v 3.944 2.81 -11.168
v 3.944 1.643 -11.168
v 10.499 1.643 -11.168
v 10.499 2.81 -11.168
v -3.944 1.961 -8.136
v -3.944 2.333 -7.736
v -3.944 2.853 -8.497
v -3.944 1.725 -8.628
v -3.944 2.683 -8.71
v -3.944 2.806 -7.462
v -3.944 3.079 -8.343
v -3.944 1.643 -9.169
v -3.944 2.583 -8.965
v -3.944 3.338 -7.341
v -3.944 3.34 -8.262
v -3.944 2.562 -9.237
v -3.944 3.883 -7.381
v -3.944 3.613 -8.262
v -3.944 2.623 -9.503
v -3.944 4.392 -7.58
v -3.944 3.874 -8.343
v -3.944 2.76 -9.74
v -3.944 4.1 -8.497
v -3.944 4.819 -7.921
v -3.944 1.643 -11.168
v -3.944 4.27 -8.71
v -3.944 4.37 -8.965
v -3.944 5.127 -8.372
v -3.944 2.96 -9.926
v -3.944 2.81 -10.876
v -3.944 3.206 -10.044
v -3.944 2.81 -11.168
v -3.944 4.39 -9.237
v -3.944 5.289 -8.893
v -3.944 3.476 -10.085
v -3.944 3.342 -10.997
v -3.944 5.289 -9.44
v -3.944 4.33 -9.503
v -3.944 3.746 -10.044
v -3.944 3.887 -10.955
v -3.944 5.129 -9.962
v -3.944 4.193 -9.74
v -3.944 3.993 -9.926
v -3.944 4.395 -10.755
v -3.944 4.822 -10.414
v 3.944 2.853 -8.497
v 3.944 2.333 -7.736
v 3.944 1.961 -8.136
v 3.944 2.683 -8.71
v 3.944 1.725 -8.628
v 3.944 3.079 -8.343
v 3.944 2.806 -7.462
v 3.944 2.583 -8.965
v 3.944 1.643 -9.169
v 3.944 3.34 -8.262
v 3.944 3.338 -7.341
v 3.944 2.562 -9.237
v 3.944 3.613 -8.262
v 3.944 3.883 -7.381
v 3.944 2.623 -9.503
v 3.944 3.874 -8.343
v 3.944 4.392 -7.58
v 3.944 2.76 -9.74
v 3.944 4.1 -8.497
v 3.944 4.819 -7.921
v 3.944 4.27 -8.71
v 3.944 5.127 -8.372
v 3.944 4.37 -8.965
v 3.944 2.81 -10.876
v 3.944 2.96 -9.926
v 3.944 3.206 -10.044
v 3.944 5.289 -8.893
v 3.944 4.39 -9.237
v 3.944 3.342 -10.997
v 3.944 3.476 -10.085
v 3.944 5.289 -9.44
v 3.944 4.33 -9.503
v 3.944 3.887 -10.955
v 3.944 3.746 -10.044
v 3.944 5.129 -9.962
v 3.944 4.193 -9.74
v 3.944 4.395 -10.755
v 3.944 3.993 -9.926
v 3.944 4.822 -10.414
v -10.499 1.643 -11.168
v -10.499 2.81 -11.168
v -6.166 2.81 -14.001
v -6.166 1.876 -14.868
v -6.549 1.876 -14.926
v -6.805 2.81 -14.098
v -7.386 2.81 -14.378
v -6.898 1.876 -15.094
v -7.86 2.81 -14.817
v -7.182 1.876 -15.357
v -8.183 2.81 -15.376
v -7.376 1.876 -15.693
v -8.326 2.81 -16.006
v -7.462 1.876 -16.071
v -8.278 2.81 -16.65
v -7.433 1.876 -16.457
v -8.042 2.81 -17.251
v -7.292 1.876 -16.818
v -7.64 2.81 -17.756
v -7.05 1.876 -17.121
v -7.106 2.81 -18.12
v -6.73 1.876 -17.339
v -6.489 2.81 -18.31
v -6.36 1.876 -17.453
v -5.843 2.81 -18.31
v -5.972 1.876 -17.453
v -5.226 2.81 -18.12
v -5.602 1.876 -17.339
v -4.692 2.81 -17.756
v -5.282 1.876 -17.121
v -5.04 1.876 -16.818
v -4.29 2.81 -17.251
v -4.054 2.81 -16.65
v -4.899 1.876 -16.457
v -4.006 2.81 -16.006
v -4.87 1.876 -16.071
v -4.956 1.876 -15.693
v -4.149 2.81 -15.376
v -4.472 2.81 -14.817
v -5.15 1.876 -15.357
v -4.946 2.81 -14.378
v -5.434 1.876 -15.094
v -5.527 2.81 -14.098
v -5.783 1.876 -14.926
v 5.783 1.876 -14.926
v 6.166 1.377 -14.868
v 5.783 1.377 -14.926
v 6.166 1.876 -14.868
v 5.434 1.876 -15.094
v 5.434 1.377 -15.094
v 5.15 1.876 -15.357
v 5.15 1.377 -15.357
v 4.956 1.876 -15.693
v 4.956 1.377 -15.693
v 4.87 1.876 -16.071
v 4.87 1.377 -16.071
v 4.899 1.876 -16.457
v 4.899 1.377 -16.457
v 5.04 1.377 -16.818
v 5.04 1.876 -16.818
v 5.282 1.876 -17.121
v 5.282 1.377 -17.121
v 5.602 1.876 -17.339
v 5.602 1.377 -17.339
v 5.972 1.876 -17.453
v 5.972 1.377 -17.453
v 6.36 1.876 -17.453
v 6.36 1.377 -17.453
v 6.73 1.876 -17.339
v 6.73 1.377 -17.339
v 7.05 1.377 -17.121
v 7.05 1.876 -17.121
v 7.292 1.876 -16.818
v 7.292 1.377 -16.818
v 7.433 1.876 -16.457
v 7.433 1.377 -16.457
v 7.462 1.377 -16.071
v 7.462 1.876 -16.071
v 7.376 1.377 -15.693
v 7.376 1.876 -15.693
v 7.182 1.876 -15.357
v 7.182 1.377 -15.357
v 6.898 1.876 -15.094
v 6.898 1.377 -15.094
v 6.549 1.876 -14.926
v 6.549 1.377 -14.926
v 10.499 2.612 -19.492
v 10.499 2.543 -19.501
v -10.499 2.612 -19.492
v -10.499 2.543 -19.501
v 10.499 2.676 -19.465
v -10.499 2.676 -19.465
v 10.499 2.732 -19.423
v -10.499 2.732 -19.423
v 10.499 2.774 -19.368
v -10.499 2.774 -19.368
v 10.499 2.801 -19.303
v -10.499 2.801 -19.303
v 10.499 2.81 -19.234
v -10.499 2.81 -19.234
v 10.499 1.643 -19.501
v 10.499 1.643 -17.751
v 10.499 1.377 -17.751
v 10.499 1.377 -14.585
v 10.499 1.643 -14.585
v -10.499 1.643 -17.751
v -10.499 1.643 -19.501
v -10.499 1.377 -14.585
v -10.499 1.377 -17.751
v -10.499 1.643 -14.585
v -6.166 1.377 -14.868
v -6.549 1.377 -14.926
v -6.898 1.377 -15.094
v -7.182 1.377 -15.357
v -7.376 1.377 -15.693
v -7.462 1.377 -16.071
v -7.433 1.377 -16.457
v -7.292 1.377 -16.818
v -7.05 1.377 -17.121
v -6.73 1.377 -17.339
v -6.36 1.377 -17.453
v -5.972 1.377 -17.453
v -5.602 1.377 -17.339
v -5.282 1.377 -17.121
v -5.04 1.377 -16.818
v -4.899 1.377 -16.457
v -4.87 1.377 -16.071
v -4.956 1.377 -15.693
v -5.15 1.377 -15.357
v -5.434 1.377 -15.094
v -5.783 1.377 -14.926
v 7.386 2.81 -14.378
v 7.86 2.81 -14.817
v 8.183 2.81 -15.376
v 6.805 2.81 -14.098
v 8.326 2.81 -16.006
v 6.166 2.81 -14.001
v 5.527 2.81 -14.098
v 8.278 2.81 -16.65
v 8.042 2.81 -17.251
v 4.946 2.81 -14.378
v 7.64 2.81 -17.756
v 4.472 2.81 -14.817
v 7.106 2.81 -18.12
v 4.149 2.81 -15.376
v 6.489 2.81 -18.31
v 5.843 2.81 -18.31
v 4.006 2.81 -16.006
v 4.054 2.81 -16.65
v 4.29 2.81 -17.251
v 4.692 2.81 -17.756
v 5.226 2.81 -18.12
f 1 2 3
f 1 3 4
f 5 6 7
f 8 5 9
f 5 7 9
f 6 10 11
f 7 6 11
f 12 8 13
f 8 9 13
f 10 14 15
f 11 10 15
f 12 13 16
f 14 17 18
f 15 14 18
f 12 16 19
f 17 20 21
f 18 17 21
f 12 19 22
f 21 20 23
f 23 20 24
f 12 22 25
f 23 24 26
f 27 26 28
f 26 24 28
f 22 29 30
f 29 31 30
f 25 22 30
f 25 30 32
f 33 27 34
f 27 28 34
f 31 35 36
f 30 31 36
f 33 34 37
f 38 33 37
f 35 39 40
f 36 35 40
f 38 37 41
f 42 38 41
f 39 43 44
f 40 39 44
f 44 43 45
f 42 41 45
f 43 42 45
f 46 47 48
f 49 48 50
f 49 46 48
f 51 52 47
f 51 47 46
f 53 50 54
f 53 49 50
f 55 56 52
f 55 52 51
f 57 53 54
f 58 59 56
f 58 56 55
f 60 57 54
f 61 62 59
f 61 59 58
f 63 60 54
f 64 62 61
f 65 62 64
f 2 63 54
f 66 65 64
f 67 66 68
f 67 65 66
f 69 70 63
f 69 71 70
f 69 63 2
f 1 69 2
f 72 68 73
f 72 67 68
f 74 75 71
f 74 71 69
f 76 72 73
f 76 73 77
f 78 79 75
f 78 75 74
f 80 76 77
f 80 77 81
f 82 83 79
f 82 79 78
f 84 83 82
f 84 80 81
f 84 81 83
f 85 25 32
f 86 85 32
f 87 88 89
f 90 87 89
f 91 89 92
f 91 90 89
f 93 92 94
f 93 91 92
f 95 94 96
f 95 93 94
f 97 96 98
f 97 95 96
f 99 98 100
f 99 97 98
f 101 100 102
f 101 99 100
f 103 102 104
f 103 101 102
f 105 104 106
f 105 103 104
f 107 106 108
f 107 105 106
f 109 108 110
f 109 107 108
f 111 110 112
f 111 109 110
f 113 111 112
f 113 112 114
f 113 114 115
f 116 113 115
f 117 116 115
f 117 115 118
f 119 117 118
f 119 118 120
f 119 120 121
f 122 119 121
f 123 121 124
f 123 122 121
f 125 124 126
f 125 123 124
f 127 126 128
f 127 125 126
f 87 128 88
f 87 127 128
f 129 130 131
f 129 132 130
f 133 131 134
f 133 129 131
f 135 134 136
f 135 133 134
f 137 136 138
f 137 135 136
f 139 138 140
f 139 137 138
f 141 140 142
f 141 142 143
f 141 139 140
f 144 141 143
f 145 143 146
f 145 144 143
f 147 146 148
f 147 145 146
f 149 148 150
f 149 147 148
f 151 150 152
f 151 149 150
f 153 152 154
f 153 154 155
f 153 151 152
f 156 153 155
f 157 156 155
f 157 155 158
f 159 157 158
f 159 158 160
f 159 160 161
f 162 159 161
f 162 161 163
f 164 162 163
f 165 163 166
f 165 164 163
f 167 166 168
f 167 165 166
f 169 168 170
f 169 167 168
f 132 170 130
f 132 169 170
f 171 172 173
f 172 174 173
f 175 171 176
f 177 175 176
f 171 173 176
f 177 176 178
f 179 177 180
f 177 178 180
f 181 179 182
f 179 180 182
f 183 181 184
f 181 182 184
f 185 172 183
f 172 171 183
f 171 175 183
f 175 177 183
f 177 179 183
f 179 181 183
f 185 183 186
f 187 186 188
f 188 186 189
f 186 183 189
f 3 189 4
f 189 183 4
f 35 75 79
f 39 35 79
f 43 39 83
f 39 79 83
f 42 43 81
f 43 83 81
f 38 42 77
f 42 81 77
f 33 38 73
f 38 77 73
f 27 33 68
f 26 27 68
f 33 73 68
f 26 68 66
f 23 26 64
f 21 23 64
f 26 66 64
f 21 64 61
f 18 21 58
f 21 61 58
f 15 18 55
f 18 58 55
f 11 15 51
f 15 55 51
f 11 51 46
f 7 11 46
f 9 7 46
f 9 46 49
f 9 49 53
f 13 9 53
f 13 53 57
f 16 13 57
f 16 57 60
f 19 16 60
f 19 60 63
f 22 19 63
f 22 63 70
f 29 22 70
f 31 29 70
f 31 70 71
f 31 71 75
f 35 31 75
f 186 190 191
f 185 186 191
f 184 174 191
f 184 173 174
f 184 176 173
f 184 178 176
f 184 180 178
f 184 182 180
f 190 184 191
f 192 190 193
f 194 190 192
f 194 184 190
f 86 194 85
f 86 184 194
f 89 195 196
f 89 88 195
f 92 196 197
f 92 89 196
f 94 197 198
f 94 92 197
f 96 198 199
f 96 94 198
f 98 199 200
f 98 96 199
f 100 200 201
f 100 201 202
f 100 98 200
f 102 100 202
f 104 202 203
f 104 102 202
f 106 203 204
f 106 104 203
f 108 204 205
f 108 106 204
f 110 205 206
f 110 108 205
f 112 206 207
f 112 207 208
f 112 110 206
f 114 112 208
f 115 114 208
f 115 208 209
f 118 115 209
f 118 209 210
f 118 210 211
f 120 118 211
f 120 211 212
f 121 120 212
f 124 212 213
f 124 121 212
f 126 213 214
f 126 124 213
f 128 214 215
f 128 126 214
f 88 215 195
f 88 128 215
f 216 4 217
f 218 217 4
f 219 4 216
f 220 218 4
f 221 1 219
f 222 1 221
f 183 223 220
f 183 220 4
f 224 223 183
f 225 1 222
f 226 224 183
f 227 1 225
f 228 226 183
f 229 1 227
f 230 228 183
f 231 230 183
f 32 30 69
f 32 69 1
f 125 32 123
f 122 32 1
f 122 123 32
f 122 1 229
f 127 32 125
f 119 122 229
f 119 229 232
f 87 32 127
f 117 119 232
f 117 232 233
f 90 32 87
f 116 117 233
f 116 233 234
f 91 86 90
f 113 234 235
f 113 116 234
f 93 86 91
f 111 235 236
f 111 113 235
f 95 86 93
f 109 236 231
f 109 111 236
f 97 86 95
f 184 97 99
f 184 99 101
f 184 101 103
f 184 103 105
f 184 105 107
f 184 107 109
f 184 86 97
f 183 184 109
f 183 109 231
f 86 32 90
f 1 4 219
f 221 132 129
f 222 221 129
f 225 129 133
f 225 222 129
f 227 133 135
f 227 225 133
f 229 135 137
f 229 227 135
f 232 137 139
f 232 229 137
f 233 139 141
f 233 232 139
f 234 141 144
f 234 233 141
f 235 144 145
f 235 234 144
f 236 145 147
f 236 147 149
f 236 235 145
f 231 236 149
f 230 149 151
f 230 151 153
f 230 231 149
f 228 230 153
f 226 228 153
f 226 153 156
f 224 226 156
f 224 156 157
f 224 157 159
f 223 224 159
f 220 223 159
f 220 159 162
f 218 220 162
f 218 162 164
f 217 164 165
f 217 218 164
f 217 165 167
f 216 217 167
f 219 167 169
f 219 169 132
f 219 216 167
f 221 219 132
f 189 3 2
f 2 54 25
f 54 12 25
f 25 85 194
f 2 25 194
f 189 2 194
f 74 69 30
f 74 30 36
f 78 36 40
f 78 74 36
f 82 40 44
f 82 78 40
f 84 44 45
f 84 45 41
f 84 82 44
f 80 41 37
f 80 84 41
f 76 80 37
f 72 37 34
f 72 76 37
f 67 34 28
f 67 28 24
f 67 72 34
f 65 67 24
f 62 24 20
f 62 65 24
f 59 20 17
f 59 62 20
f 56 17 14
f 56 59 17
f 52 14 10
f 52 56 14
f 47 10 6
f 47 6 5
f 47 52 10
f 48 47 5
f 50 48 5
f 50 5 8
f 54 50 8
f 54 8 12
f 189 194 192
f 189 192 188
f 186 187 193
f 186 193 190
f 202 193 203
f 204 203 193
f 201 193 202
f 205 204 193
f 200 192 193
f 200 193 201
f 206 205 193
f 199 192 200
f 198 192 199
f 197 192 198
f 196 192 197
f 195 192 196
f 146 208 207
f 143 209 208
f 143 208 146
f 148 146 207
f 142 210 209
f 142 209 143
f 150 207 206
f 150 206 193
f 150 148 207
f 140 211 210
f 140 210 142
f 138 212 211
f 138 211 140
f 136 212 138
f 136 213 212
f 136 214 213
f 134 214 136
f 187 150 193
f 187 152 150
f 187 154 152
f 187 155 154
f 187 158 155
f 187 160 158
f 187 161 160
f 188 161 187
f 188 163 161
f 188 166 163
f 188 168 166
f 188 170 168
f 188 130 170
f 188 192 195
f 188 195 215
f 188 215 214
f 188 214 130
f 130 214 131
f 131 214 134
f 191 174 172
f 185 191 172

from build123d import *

# Parameters (mm, degrees)
BOSS_EXTRUDE1_DEPTH        = 23.666666667
SKETCH2_W                  = 25
SKETCH2_H                  = 3.5
BOSS_EXTRUDE2_DEPTH        = 19.666666667
SKETCH3_W                  = 25
SKETCH3_H                  = 3.5
BOSS_EXTRUDE3_DEPTH        = 19.666666667
SKETCH4_W                  = 63
SKETCH4_H                  = 14.75
BOSS_EXTRUDE4_DEPTH        = 0.8
SKETCH5_W                  = 5.25
SKETCH5_H                  = 0.8
CUT_EXTRUDE1_DEPTH         = 72.070387645
F_10_CLEARANCE_HOLE1_D     = 5.5
F_10_CLEARANCE_HOLE1_DEPTH = 43.333333333
HOLE1_AT_2_COUNT           = 2
HOLE1_AT_2_PITCH           = 37
FILLET1_R                  = 0.8
SCALE1_SCALE               = 0.3333


with BuildPart() as part:
    # Sketch1 → Boss-Extrude1 (new body)
    with BuildSketch(Plane(origin=(11.833333333, 0, 0), x_dir=(0, 0, -1), z_dir=(1, 0, 0))):
        with BuildLine():
            Line((31, 3.5), (5.123475383, 3.5))
            ThreePointArc((5.123475383, 3.5), (-3.102418411, 10.041475531), (0, 0))
            Line((0, 0), (31, 0))
            Line((31, 0), (31, 3.5))
        make_face()
    extrude(amount=-BOSS_EXTRUDE1_DEPTH)

    # Sketch2 → Boss-Extrude2 (add)
    with BuildSketch(Plane.ZY.offset(11.833333333)):
        with Locations((-18.5, 1.75)):
            Rectangle(SKETCH2_W, SKETCH2_H)
    extrude(amount=BOSS_EXTRUDE2_DEPTH)

    # Sketch3 → Boss-Extrude3 (add)
    with BuildSketch(Plane(origin=(11.833333333, 0, 0), x_dir=(0, 0, -1), z_dir=(1, 0, 0))):
        with Locations((18.5, 1.75)):
            Rectangle(SKETCH3_W, SKETCH3_H)
    extrude(amount=BOSS_EXTRUDE3_DEPTH)

    # Sketch4 → Boss-Extrude4 (add)
    with BuildSketch(Plane.XZ):
        with Locations((0, -23.625)):
            Rectangle(SKETCH4_W, SKETCH4_H)
    extrude(amount=BOSS_EXTRUDE4_DEPTH)

    # Sketch5 → Cut-Extrude1 (cut, through all)
    with BuildSketch(Plane(origin=(31.5, 0, 0), x_dir=(0, 0, -1), z_dir=(1, 0, 0))):
        with Locations((28.375, -0.4)):
            Rectangle(SKETCH5_W, SKETCH5_H)
    extrude(amount=-CUT_EXTRUDE1_DEPTH, mode=Mode.SUBTRACT)

    # #10 Clearance Hole1
    with Locations(Plane.ZY.offset(11.833333333)):
        with Locations((0, 5.5)):
            Hole(F_10_CLEARANCE_HOLE1_D / 2, depth=F_10_CLEARANCE_HOLE1_DEPTH)

    # Sketch8 → Hole1 (revolve, cut)
    with BuildSketch(Plane(origin=(-18.5, 3.5, -21), x_dir=(0, 0, 1), z_dir=(1, 0, 0))):
        Polygon((0, 0), (0, 4.3), (3.9, 4.3), (3.9, 2.8), (6.5, 0), align=None)
    hole1 = revolve(axis=Axis((-18.5, 9.945314094, -21), (0, -1, 0)), mode=Mode.SUBTRACT)

    # Hole1 at 2: Hole1 ×2
    with Locations(*[(i * HOLE1_AT_2_PITCH, 0, 0) for i in range(1, HOLE1_AT_2_COUNT)]):
        add(hole1, mode=Mode.SUBTRACT)

    # Fillet1
    fillet1_edges = [part.edges().sort_by_distance(p)[0] for p in [
        (0, 3.5, -31),
    ]]
    fillet(fillet1_edges, radius=FILLET1_R)


with BuildPart() as part_1:
    # Scale1: scaled about (0, 2.464609402, -13.752110163)
    add(part.part.scale(SCALE1_SCALE).moved(Location((0, 1.643155088, -9.168531846))))


solid = part_1.part
